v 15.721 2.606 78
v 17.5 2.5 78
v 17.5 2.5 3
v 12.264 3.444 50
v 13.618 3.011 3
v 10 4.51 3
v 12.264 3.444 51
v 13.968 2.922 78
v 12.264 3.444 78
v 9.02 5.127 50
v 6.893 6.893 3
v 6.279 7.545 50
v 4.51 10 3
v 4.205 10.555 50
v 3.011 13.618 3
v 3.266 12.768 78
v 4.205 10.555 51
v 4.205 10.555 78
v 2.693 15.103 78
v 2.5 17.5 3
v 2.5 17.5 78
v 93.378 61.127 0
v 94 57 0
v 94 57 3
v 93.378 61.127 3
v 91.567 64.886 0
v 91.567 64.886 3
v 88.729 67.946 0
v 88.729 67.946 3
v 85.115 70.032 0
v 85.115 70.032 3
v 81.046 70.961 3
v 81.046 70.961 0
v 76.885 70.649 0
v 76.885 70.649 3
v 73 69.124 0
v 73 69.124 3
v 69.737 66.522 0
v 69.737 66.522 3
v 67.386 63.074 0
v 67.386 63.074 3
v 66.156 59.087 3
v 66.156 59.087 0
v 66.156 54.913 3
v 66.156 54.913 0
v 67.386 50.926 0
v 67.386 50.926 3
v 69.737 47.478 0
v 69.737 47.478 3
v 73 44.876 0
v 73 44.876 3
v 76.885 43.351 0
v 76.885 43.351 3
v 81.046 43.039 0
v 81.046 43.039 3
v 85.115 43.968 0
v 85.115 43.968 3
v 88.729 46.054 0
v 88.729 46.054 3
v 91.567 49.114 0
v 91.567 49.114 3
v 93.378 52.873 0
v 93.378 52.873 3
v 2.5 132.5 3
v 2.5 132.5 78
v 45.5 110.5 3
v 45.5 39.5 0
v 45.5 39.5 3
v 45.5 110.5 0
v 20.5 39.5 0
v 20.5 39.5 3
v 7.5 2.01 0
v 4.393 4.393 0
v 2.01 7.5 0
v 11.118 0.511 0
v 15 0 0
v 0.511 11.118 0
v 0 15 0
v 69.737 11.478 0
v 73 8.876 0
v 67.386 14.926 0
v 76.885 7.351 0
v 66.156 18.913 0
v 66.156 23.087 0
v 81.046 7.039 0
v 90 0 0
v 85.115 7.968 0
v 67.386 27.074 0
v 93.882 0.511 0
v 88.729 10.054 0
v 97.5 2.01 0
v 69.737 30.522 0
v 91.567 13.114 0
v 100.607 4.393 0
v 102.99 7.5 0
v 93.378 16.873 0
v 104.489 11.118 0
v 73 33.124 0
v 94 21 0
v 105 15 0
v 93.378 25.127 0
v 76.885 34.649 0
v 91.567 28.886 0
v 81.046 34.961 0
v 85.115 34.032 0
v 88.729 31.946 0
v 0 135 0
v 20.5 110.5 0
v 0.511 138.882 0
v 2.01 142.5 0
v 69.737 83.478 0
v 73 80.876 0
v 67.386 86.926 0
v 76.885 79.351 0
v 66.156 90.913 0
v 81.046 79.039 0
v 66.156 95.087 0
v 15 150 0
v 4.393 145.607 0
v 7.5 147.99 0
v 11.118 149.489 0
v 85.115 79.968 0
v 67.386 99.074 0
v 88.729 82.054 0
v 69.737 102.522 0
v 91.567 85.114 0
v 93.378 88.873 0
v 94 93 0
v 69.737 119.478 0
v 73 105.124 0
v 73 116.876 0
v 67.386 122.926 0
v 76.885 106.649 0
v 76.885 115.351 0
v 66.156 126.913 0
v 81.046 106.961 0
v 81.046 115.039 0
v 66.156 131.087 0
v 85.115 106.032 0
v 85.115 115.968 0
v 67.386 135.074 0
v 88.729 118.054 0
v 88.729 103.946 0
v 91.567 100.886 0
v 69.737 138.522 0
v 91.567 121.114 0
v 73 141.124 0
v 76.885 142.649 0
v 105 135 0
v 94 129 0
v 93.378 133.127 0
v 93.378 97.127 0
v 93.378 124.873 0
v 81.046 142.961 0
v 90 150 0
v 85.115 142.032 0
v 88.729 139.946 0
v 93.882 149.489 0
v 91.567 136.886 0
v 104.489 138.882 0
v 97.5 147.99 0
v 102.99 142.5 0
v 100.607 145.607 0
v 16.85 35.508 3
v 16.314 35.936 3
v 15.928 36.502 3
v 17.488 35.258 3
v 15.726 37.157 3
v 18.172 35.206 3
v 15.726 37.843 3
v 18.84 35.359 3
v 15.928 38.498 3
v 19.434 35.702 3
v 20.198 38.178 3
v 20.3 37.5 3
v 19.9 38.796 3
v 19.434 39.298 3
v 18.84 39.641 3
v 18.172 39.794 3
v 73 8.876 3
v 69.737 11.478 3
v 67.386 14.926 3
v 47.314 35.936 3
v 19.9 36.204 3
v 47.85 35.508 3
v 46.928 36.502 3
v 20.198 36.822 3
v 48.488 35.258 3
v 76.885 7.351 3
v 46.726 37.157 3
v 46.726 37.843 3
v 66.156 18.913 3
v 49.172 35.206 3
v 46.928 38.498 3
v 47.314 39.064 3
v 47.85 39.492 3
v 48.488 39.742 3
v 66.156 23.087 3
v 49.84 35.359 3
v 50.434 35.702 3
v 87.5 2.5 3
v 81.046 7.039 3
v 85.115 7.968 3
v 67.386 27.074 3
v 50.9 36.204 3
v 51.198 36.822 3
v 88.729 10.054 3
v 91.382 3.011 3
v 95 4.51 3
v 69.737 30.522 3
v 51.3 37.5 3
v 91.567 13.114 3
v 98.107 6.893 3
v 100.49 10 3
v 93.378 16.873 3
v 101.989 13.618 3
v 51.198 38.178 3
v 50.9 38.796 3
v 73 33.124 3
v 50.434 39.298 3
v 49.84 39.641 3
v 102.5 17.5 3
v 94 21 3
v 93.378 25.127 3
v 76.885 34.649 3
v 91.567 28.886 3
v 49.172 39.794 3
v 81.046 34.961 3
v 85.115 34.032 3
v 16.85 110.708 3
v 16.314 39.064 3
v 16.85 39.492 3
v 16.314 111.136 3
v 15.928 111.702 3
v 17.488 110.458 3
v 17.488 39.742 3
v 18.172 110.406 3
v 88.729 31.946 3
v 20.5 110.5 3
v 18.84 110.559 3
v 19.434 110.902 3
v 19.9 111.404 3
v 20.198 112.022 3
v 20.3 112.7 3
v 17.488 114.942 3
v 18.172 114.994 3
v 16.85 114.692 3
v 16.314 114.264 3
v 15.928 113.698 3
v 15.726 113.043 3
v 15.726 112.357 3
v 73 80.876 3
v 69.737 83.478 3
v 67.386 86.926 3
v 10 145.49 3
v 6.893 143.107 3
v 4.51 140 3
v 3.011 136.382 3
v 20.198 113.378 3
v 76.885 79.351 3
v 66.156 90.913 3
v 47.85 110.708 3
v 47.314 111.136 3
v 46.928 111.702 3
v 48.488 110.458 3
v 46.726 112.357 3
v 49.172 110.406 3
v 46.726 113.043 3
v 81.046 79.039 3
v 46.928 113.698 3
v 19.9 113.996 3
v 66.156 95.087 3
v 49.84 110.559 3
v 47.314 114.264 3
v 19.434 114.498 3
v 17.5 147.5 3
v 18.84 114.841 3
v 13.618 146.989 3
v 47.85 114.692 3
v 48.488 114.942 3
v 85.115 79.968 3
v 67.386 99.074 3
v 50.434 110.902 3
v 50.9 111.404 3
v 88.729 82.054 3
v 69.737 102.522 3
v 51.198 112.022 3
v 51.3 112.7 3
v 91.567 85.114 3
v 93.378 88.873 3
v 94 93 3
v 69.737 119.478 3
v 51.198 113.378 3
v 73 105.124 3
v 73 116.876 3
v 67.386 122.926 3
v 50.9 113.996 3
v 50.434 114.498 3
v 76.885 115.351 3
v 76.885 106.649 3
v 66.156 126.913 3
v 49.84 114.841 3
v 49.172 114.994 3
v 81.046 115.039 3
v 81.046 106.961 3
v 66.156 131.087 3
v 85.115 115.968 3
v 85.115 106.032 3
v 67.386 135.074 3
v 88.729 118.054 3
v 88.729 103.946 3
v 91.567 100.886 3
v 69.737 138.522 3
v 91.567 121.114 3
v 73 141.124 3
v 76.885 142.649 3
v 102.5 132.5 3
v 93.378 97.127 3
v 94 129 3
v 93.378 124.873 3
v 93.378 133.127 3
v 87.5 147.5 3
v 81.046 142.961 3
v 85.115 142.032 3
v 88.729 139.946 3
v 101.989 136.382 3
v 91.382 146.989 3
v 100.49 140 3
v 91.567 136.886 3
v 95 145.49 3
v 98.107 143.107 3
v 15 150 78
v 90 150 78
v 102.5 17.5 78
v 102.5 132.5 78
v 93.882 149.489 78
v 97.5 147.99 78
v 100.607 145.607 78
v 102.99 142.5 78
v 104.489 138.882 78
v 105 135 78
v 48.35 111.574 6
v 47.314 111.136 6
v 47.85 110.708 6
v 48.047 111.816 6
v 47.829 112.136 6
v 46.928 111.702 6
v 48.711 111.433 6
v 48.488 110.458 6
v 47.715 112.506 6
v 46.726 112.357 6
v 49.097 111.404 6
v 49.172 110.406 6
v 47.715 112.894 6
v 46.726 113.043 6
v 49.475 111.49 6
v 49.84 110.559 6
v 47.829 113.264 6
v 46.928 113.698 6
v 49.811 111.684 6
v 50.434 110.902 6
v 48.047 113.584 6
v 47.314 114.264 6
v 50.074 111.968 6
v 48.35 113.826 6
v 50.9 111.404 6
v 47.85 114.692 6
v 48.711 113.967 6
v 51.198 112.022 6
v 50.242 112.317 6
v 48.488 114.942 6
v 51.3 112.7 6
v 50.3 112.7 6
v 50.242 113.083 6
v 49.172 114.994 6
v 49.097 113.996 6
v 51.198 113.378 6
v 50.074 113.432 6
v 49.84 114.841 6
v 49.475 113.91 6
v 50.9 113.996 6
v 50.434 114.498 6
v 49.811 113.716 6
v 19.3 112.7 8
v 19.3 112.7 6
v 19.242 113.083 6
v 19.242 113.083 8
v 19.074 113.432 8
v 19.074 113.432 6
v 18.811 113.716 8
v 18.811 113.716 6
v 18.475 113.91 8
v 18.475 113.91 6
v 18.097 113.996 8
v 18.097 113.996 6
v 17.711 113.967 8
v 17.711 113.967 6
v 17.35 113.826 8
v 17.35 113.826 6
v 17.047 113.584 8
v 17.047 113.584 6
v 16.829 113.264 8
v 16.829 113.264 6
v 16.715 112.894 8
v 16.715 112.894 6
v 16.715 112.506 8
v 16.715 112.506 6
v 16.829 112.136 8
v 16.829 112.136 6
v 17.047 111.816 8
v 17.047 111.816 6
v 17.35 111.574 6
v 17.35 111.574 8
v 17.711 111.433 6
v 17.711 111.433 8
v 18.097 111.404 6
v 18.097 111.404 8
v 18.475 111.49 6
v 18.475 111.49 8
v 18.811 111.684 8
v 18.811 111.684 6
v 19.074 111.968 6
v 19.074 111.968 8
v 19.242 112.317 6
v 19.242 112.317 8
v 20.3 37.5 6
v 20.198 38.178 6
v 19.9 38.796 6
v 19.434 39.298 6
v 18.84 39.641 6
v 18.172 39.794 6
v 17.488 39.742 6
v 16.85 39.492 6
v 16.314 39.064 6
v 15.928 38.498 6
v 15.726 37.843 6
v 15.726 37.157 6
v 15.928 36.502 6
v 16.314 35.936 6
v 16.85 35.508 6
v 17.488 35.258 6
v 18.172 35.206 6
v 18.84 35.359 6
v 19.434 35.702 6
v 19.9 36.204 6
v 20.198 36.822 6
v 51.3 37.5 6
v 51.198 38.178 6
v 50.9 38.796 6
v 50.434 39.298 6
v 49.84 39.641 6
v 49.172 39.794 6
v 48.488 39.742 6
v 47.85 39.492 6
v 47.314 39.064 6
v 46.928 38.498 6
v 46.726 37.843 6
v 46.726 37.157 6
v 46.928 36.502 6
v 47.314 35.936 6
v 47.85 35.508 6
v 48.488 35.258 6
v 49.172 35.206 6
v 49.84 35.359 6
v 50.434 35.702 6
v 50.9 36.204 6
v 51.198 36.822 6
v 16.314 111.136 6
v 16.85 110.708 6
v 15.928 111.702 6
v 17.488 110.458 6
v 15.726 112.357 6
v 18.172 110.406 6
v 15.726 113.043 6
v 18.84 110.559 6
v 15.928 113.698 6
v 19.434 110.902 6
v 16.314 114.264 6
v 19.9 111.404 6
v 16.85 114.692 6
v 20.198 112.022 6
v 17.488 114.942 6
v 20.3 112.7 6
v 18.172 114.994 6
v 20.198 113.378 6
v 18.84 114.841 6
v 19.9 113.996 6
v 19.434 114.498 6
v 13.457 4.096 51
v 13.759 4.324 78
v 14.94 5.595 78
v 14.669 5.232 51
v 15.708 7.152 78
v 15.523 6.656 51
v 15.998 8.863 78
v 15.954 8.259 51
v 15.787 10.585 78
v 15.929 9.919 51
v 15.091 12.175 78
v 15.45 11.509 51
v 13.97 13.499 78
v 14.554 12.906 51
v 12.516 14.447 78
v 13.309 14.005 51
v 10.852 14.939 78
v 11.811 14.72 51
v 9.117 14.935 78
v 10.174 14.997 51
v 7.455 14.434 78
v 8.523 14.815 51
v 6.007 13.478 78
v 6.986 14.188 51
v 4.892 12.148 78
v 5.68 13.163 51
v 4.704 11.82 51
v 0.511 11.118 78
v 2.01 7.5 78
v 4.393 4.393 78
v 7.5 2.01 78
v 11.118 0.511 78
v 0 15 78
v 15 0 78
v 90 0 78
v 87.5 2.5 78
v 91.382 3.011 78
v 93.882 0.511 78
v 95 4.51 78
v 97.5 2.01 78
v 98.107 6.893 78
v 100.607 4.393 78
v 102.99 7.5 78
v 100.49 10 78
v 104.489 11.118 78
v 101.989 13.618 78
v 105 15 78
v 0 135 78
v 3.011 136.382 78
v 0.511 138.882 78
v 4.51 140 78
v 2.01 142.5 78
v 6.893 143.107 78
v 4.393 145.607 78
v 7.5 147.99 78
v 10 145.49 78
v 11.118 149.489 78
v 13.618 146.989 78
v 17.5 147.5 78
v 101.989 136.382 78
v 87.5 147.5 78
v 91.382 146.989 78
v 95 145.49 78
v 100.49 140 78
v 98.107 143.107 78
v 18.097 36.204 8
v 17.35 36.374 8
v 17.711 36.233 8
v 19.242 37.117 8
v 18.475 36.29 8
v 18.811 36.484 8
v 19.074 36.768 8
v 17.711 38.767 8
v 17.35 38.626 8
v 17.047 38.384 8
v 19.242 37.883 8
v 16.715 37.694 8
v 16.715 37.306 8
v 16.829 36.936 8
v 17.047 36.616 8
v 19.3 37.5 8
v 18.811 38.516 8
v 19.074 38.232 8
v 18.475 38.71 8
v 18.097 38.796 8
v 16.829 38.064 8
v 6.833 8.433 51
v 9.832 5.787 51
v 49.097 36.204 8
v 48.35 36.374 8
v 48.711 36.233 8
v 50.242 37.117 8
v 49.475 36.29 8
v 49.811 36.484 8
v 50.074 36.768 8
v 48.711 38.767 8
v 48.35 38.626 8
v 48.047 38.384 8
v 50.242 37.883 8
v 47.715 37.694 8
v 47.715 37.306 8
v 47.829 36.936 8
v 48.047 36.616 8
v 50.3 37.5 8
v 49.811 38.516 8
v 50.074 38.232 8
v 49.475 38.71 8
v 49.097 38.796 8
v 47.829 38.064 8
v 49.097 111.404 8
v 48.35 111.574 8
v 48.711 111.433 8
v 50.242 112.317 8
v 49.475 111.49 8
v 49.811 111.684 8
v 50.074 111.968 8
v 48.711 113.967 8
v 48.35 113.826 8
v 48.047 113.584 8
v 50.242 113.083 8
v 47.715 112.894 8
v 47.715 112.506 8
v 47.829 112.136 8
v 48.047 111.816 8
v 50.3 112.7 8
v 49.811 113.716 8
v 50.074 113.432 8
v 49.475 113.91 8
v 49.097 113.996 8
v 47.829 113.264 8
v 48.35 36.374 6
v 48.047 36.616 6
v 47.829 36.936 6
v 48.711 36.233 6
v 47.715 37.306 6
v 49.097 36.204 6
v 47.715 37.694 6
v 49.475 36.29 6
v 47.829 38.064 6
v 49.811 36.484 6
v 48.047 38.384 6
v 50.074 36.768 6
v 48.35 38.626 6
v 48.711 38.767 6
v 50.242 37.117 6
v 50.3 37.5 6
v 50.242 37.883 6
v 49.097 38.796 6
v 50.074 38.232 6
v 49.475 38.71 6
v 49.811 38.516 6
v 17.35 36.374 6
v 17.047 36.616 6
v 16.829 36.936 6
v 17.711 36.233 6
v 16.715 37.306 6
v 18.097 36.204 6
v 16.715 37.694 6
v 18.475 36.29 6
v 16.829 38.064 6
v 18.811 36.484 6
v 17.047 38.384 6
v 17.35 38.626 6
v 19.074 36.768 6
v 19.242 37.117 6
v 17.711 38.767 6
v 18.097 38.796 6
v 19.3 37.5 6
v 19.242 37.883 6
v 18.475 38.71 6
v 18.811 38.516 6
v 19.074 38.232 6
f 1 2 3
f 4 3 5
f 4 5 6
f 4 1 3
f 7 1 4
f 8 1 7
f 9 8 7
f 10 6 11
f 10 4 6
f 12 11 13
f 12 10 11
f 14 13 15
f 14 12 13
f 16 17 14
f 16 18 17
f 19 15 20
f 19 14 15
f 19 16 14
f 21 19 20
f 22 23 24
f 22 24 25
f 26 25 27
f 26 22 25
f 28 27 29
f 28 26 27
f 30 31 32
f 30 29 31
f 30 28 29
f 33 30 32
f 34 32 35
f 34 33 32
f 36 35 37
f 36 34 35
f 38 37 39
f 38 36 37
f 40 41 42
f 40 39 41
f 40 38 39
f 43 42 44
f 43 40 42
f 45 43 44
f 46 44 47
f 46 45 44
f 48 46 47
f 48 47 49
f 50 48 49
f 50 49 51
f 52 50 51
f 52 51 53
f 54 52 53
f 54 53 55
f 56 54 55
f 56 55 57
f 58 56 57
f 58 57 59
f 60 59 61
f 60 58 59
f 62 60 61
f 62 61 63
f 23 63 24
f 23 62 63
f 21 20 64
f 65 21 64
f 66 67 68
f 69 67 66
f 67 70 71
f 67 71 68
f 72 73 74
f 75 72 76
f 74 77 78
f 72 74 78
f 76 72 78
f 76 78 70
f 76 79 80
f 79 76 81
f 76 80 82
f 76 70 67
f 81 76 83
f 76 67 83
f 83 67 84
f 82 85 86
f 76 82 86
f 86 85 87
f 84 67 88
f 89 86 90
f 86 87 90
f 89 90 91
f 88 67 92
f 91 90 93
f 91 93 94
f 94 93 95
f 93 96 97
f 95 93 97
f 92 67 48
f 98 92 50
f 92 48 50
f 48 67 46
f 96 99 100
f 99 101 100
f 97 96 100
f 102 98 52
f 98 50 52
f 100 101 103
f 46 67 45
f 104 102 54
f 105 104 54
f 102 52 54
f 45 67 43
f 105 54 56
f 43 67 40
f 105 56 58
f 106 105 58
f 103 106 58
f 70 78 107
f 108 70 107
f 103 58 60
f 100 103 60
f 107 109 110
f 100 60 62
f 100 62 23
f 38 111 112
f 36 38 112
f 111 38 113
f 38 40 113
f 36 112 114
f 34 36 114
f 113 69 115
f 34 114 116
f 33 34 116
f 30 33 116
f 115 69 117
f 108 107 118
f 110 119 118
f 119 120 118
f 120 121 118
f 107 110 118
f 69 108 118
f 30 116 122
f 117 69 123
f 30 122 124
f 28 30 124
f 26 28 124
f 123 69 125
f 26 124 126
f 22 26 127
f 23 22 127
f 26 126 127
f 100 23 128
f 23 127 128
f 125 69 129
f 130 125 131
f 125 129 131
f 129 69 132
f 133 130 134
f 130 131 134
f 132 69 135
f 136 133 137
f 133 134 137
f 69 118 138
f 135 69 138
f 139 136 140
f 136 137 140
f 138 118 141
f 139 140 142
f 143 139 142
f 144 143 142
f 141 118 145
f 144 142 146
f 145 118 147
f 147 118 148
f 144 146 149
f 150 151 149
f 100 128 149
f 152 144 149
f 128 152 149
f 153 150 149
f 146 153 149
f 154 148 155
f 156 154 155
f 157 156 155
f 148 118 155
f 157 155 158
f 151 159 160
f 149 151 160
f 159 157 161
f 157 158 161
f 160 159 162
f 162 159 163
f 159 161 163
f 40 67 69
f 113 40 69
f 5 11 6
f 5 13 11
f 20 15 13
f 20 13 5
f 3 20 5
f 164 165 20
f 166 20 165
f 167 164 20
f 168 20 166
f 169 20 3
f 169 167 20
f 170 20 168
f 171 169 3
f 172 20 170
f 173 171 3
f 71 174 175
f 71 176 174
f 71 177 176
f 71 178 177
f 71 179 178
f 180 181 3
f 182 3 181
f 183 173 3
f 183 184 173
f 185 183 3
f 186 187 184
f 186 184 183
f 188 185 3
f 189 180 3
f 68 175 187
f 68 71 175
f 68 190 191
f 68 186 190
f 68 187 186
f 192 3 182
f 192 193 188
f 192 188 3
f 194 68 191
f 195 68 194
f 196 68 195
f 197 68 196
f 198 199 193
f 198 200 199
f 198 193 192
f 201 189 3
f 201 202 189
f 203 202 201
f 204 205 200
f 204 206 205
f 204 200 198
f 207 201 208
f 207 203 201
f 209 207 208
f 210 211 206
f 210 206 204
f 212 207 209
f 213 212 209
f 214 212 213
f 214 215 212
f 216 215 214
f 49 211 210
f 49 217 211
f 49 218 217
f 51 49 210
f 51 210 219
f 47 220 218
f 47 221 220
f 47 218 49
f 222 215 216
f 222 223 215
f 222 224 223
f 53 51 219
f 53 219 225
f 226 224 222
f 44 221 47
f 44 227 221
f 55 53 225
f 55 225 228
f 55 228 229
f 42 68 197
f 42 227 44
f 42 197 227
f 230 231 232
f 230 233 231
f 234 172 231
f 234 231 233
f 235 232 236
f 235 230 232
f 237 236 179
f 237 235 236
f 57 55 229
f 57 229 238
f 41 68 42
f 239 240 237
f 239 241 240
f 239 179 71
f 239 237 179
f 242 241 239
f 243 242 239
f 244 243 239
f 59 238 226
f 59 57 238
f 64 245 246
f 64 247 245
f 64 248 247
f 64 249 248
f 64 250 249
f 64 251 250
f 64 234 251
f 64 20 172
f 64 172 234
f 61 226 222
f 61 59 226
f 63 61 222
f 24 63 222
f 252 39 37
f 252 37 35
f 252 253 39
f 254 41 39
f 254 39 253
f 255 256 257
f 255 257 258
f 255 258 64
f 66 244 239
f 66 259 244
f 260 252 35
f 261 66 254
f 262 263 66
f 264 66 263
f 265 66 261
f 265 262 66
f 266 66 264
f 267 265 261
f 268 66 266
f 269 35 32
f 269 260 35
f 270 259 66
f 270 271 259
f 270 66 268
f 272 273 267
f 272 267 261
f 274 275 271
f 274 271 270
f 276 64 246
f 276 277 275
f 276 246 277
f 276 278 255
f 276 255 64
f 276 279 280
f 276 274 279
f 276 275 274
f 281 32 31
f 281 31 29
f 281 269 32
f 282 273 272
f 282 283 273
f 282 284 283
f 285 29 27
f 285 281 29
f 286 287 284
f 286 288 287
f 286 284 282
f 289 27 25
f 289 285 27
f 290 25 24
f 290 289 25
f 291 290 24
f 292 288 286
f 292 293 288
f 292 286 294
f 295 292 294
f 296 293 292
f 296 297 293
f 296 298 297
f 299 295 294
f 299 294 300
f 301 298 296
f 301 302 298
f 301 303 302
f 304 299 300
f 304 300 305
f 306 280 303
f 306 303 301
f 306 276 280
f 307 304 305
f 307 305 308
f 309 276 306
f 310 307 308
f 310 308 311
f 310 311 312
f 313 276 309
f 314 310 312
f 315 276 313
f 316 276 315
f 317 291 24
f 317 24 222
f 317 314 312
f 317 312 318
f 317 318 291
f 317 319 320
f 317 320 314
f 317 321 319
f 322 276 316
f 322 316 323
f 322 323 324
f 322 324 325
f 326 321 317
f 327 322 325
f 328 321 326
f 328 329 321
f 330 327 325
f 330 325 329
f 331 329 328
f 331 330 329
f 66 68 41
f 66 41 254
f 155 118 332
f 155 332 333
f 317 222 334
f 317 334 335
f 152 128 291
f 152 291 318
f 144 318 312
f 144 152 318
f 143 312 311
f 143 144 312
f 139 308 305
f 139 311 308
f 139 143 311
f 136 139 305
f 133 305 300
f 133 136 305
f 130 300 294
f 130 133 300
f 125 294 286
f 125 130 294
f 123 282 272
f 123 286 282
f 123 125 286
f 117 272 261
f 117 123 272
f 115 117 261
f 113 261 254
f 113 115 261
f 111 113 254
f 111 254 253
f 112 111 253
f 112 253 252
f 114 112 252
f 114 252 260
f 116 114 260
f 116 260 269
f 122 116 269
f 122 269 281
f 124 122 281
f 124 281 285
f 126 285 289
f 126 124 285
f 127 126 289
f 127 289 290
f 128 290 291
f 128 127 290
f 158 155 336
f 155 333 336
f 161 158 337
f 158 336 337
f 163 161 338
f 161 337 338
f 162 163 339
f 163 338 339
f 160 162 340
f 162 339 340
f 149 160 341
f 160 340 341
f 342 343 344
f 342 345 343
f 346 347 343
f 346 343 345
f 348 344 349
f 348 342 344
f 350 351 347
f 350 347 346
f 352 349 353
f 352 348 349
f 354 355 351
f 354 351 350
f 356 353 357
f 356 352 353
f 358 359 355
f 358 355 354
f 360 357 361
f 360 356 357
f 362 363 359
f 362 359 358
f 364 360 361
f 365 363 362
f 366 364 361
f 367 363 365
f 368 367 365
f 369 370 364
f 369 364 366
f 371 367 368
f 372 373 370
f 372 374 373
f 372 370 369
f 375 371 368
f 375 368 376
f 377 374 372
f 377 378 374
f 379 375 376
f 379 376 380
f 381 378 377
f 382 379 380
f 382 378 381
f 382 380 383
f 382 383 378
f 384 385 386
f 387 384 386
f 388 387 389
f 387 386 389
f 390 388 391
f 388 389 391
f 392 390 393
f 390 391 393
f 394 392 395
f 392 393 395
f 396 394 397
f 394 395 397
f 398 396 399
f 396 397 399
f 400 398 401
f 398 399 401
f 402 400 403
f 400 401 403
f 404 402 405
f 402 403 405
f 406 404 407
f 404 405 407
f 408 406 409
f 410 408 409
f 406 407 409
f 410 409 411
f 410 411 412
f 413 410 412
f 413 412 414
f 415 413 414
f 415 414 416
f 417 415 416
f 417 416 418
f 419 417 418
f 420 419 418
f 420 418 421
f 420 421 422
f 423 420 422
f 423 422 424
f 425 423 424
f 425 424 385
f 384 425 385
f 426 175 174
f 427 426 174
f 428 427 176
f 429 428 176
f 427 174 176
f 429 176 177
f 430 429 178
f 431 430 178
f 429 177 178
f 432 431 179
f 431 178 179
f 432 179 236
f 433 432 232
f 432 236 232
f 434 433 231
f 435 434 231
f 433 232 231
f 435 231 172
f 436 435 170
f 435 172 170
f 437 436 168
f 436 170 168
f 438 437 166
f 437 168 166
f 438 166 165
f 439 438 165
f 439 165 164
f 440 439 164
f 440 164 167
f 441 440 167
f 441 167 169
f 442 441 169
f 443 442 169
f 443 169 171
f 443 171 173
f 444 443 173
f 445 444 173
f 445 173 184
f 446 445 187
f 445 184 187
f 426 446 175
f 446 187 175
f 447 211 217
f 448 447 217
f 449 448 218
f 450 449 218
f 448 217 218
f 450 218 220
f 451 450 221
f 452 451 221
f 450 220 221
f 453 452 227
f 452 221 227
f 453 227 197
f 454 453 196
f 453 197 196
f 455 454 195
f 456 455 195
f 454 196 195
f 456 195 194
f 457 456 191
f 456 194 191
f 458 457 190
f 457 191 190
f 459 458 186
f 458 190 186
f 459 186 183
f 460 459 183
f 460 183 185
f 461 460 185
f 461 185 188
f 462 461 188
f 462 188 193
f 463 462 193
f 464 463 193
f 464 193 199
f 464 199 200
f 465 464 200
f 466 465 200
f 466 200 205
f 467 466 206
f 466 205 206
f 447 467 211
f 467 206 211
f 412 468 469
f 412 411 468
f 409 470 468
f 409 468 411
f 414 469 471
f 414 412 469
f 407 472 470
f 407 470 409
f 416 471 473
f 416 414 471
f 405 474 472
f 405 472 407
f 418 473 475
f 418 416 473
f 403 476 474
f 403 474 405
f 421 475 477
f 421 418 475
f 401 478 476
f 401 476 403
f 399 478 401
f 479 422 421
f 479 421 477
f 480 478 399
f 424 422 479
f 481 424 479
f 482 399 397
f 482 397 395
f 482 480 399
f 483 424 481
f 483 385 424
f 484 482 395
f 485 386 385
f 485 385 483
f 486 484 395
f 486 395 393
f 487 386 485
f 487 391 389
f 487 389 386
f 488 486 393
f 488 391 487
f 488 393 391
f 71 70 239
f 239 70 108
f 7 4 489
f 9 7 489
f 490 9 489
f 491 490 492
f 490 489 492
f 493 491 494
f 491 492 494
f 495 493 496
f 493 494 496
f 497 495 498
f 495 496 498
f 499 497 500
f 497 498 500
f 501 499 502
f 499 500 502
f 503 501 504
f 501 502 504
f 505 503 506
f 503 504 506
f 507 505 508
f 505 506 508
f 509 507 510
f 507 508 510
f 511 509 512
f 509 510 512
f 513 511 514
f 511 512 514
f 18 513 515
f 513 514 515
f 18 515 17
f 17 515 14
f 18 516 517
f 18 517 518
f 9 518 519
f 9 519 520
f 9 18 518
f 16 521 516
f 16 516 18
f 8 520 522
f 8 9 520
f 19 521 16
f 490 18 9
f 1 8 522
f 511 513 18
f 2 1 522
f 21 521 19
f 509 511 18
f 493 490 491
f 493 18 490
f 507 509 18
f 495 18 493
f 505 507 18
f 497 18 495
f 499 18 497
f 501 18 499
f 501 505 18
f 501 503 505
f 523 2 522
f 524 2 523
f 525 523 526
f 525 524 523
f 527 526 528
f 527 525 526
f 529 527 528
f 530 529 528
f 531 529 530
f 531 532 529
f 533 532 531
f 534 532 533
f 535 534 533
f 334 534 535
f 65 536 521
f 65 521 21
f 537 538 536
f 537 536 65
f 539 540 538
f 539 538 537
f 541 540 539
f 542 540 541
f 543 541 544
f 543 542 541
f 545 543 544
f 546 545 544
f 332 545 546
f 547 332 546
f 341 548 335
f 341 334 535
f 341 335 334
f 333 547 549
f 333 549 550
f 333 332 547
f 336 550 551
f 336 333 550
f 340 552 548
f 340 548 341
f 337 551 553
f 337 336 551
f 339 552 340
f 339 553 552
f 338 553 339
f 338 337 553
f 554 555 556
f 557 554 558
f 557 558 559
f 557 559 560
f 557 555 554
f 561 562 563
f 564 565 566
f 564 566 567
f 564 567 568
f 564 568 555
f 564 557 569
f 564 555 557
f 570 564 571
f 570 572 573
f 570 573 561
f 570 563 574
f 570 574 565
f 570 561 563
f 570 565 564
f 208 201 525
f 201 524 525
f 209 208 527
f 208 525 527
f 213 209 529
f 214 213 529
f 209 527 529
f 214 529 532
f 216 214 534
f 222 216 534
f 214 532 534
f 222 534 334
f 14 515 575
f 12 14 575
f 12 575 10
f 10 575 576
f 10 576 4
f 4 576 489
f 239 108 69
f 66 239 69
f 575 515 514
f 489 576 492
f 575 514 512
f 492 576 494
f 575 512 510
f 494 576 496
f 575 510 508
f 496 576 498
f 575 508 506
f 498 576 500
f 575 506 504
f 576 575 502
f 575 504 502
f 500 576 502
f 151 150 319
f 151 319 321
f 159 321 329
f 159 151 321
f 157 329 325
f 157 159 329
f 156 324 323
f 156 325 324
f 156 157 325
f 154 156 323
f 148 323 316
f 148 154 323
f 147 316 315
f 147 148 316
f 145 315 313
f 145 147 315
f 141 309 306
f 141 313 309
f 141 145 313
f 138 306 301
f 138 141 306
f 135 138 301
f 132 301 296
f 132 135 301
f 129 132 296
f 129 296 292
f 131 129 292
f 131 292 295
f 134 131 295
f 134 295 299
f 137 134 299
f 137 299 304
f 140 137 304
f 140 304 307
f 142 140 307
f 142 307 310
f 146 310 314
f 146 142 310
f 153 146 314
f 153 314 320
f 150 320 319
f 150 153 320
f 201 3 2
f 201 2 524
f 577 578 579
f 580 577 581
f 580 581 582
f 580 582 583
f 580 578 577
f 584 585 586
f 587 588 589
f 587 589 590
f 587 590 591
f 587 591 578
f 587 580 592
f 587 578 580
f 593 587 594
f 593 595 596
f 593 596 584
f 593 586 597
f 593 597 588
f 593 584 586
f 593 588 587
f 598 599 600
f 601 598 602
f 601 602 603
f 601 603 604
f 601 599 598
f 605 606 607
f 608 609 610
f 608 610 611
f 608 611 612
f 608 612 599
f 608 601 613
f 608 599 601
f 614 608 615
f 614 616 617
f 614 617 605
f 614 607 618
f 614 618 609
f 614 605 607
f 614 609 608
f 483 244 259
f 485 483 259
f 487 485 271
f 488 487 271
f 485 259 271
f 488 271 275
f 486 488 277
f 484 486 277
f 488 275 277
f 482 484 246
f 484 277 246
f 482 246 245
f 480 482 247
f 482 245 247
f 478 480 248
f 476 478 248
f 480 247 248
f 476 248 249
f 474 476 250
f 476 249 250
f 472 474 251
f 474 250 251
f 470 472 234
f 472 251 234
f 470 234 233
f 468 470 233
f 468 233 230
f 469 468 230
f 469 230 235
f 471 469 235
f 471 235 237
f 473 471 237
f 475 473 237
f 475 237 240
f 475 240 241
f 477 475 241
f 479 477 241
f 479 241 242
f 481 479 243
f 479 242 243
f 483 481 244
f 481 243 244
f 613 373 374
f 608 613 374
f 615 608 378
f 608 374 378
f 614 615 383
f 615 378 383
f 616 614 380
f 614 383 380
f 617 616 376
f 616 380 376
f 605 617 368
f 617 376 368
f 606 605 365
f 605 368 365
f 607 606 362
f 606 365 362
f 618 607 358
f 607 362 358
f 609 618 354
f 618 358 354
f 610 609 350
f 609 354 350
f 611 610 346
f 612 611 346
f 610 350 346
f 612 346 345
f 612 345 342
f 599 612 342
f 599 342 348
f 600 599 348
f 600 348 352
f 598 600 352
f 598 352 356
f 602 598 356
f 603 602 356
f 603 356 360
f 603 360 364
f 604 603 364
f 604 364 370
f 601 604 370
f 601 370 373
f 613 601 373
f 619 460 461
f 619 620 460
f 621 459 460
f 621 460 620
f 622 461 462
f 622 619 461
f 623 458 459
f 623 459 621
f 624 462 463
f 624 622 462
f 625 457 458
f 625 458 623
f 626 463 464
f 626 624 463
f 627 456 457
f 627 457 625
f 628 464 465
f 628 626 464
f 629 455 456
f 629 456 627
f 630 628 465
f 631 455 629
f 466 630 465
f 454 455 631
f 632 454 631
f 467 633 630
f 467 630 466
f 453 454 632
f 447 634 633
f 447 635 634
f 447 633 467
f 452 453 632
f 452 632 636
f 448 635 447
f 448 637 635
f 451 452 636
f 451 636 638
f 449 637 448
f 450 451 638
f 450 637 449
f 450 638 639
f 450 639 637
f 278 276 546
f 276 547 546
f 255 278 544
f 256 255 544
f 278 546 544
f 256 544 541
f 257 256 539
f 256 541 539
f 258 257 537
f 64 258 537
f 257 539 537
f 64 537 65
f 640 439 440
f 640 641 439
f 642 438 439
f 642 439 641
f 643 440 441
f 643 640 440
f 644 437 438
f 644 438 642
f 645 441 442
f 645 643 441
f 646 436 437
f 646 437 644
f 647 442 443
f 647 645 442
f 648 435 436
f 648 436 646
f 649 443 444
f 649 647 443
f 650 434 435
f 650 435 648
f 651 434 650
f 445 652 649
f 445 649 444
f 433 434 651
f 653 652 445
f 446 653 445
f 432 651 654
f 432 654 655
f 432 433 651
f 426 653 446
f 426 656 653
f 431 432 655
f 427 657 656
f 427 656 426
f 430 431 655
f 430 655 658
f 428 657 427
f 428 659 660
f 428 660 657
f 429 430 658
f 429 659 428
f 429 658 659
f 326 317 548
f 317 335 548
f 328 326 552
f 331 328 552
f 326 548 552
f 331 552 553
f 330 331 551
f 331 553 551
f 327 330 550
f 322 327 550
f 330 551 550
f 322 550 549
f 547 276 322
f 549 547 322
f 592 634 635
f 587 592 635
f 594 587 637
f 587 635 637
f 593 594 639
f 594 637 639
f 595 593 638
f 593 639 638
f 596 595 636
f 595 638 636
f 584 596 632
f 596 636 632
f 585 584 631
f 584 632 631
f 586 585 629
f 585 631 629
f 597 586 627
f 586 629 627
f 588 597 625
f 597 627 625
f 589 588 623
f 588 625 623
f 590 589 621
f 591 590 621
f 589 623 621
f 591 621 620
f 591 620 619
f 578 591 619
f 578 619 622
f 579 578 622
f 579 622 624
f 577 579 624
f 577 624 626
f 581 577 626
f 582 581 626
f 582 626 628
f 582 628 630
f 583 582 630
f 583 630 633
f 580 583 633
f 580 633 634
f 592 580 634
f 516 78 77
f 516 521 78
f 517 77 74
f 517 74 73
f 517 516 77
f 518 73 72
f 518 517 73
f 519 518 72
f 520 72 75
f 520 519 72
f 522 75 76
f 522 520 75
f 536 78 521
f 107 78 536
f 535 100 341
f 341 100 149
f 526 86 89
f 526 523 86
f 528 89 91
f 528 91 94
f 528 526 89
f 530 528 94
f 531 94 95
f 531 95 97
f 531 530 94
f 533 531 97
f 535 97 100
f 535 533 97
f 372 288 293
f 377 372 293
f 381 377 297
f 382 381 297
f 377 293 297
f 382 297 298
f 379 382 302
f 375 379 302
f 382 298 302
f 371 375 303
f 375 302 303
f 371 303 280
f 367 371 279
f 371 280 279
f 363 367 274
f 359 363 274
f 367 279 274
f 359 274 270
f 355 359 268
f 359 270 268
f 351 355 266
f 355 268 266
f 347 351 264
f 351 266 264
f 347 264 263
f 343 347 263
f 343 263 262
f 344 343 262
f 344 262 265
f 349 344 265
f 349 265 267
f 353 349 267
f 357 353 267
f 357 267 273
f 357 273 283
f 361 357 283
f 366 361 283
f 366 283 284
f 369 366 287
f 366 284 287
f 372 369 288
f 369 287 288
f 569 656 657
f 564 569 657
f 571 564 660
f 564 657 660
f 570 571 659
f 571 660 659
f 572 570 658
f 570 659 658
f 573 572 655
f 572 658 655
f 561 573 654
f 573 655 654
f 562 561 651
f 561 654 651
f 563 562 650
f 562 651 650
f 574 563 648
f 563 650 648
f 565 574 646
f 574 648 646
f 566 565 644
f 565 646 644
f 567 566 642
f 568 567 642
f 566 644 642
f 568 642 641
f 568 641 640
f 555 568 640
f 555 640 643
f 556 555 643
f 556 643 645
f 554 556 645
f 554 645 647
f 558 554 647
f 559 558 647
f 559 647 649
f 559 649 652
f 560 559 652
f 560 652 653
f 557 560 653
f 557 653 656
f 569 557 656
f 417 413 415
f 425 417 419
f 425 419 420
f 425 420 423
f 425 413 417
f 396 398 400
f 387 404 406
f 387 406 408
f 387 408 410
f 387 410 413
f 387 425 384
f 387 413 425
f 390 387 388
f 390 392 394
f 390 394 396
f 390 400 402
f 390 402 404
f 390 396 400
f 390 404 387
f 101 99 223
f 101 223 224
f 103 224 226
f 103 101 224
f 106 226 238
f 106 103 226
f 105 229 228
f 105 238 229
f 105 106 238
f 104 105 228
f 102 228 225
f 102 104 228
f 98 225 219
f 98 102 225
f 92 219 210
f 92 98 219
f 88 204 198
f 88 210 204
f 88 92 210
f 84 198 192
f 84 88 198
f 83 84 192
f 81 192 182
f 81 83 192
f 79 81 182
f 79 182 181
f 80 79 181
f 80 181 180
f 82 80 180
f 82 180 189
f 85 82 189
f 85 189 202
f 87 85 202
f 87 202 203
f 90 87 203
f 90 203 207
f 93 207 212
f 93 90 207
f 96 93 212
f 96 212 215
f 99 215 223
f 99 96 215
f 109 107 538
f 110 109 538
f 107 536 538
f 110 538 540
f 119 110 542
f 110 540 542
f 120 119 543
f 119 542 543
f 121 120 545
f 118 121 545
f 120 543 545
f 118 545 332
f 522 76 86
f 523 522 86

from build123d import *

# Parameters (mm, degrees)
CYLINDER003_R     = 6
CYLINDER003_DEPTH = 27
CYLINDER002_R     = 2.3
CYLINDER002_DEPTH = 3
ARRAY002_X_COUNT  = 2
ARRAY002_X_PITCH  = 31
ARRAY002_Y_COUNT  = 2
ARRAY002_Y_PITCH  = 75.2
CYLINDER001_R     = 1.3
CYLINDER001_DEPTH = 5
ARRAY001_X_COUNT  = 2
ARRAY001_X_PITCH  = 31
ARRAY001_Y_COUNT  = 2
ARRAY001_Y_PITCH  = 75.2
BOX002_W          = 25
BOX002_H          = 71
BOX002_DEPTH      = 10
CYLINDER_R        = 14
CYLINDER_DEPTH    = 10
ARRAY_Y_COUNT     = 4
ARRAY_Y_PITCH     = 36
BOX001_W          = 100
BOX001_H          = 145
BOX001_DEPTH      = 75
BOX_W             = 105
BOX_H             = 150
BOX_DEPTH         = 78
FILLET_R          = 15
FILLET001_R       = 15
CHAMFER001_SIZE   = 1


with BuildPart() as cilindro003:
    # Cylinder003 → Cylinder003 (new body)
    with BuildSketch(Plane(origin=(10, 9, 51), x_dir=(1, 0, 0), z_dir=(0, 0, 1))):
        Circle(CYLINDER003_R)
    extrude(amount=CYLINDER003_DEPTH)


with BuildPart() as array002:
    # Cylinder002 → Cylinder002 (new body)
    with BuildSketch(Plane(origin=(18, 37.5, 3), x_dir=(1, 0, 0), z_dir=(0, 0, 1))):
        Circle(CYLINDER002_R)
    extrude(amount=CYLINDER002_DEPTH)

    # Array002 X: Array002 ×2


with BuildPart() as array002_1:
    add(array002.part)
    with Locations(*[(i * ARRAY002_X_PITCH, 0, 0) for i in range(1, ARRAY002_X_COUNT)]):
        add(array002.part)

    # Array002 Y: Array002 ×2


with BuildPart() as array002_2:
    add(array002_1.part)
    with Locations(*[(0, i * ARRAY002_Y_PITCH, 0) for i in range(1, ARRAY002_Y_COUNT)]):
        add(array002_1.part)


with BuildPart() as fusion:
    # Cylinder001 → Cylinder001 (new body)
    with BuildSketch(Plane(origin=(18, 37.5, 3), x_dir=(1, 0, 0), z_dir=(0, 0, 1))):
        Circle(CYLINDER001_R)
    extrude(amount=CYLINDER001_DEPTH)

    # Array001 X: Fusion ×2


with BuildPart() as fusion_1:
    add(fusion.part)
    with Locations(*[(i * ARRAY001_X_PITCH, 0, 0) for i in range(1, ARRAY001_X_COUNT)]):
        add(fusion.part)

    # Array001 Y: Fusion ×2


with BuildPart() as fusion_2:
    add(fusion_1.part)
    with Locations(*[(0, i * ARRAY001_Y_PITCH, 0) for i in range(1, ARRAY001_Y_COUNT)]):
        add(fusion_1.part)

    # Fusion: union Array002
    add(array002_2.part)


with BuildPart() as cubo002:
    # Box002 → Box002 (new body)
    with BuildSketch(Plane(origin=(20.5, 39.5, -1), x_dir=(1, 0, 0), z_dir=(0, 0, 1))):
        with Locations((12.5, 35.5)):
            Rectangle(BOX002_W, BOX002_H)
    extrude(amount=BOX002_DEPTH)


with BuildPart() as botones:
    # Cylinder → Cylinder (new body)
    with BuildSketch(Plane(origin=(80, 25, 0), x_dir=(1, 0, 0), z_dir=(0, 0, 1))):
        Circle(CYLINDER_R)
    extrude(amount=CYLINDER_DEPTH)

    # Array Y: Botones ×4


with BuildPart() as botones_1:
    add(botones.part)
    with Locations(*[(0, i * ARRAY_Y_PITCH, 0) for i in range(1, ARRAY_Y_COUNT)]):
        add(botones.part)


with BuildPart() as botones_2:
    # Array placement: moved
    add(botones_1.part.moved(Location((0, -4, -2))))


with BuildPart() as cubo001:
    # Box001 → Box001 (new body)
    with BuildSketch(Plane(origin=(2.5, 2.5, 3), x_dir=(1, 0, 0), z_dir=(0, 0, 1))):
        with Locations((50, 72.5)):
            Rectangle(BOX001_W, BOX001_H)
    extrude(amount=BOX001_DEPTH)


with BuildPart() as chamfer001:
    # Box → Box (new body)
    with BuildSketch(Plane.XY):
        with Locations((52.5, 75)):
            Rectangle(BOX_W, BOX_H)
    extrude(amount=BOX_DEPTH)

    # Cut: cut Cubo001
    add(cubo001.part, mode=Mode.SUBTRACT)

    # Cut001: cut Botones
    add(botones_2.part, mode=Mode.SUBTRACT)

    # Cut002: cut Cubo002
    add(cubo002.part, mode=Mode.SUBTRACT)

    # Fillet
    fillet_edges = [chamfer001.edges().sort_by_distance(p)[0] for p in [
        (2.5, 2.5, 40.5),
        (2.5, 147.5, 40.5),
        (102.5, 2.5, 40.5),
        (102.5, 147.5, 40.5),
    ]]
    fillet(fillet_edges, radius=FILLET_R)

    # Fillet001
    fillet001_edges = [chamfer001.edges().sort_by_distance(p)[0] for p in [
        (0, 0, 39),
        (0, 150, 39),
        (105, 150, 39),
        (105, 0, 39),
    ]]
    fillet(fillet001_edges, radius=FILLET001_R)

    # Fusion001: union Fusion
    add(fusion_2.part)

    # Fusion002: union Cilindro003
    add(cilindro003.part)

    # Chamfer001
    chamfer001_edges = [chamfer001.edges().sort_by_distance(p)[0] for p in [
        (7.575675, 6.252432, 51),
    ]]
    chamfer(chamfer001_edges, length=CHAMFER001_SIZE)


solid = chamfer001.part
